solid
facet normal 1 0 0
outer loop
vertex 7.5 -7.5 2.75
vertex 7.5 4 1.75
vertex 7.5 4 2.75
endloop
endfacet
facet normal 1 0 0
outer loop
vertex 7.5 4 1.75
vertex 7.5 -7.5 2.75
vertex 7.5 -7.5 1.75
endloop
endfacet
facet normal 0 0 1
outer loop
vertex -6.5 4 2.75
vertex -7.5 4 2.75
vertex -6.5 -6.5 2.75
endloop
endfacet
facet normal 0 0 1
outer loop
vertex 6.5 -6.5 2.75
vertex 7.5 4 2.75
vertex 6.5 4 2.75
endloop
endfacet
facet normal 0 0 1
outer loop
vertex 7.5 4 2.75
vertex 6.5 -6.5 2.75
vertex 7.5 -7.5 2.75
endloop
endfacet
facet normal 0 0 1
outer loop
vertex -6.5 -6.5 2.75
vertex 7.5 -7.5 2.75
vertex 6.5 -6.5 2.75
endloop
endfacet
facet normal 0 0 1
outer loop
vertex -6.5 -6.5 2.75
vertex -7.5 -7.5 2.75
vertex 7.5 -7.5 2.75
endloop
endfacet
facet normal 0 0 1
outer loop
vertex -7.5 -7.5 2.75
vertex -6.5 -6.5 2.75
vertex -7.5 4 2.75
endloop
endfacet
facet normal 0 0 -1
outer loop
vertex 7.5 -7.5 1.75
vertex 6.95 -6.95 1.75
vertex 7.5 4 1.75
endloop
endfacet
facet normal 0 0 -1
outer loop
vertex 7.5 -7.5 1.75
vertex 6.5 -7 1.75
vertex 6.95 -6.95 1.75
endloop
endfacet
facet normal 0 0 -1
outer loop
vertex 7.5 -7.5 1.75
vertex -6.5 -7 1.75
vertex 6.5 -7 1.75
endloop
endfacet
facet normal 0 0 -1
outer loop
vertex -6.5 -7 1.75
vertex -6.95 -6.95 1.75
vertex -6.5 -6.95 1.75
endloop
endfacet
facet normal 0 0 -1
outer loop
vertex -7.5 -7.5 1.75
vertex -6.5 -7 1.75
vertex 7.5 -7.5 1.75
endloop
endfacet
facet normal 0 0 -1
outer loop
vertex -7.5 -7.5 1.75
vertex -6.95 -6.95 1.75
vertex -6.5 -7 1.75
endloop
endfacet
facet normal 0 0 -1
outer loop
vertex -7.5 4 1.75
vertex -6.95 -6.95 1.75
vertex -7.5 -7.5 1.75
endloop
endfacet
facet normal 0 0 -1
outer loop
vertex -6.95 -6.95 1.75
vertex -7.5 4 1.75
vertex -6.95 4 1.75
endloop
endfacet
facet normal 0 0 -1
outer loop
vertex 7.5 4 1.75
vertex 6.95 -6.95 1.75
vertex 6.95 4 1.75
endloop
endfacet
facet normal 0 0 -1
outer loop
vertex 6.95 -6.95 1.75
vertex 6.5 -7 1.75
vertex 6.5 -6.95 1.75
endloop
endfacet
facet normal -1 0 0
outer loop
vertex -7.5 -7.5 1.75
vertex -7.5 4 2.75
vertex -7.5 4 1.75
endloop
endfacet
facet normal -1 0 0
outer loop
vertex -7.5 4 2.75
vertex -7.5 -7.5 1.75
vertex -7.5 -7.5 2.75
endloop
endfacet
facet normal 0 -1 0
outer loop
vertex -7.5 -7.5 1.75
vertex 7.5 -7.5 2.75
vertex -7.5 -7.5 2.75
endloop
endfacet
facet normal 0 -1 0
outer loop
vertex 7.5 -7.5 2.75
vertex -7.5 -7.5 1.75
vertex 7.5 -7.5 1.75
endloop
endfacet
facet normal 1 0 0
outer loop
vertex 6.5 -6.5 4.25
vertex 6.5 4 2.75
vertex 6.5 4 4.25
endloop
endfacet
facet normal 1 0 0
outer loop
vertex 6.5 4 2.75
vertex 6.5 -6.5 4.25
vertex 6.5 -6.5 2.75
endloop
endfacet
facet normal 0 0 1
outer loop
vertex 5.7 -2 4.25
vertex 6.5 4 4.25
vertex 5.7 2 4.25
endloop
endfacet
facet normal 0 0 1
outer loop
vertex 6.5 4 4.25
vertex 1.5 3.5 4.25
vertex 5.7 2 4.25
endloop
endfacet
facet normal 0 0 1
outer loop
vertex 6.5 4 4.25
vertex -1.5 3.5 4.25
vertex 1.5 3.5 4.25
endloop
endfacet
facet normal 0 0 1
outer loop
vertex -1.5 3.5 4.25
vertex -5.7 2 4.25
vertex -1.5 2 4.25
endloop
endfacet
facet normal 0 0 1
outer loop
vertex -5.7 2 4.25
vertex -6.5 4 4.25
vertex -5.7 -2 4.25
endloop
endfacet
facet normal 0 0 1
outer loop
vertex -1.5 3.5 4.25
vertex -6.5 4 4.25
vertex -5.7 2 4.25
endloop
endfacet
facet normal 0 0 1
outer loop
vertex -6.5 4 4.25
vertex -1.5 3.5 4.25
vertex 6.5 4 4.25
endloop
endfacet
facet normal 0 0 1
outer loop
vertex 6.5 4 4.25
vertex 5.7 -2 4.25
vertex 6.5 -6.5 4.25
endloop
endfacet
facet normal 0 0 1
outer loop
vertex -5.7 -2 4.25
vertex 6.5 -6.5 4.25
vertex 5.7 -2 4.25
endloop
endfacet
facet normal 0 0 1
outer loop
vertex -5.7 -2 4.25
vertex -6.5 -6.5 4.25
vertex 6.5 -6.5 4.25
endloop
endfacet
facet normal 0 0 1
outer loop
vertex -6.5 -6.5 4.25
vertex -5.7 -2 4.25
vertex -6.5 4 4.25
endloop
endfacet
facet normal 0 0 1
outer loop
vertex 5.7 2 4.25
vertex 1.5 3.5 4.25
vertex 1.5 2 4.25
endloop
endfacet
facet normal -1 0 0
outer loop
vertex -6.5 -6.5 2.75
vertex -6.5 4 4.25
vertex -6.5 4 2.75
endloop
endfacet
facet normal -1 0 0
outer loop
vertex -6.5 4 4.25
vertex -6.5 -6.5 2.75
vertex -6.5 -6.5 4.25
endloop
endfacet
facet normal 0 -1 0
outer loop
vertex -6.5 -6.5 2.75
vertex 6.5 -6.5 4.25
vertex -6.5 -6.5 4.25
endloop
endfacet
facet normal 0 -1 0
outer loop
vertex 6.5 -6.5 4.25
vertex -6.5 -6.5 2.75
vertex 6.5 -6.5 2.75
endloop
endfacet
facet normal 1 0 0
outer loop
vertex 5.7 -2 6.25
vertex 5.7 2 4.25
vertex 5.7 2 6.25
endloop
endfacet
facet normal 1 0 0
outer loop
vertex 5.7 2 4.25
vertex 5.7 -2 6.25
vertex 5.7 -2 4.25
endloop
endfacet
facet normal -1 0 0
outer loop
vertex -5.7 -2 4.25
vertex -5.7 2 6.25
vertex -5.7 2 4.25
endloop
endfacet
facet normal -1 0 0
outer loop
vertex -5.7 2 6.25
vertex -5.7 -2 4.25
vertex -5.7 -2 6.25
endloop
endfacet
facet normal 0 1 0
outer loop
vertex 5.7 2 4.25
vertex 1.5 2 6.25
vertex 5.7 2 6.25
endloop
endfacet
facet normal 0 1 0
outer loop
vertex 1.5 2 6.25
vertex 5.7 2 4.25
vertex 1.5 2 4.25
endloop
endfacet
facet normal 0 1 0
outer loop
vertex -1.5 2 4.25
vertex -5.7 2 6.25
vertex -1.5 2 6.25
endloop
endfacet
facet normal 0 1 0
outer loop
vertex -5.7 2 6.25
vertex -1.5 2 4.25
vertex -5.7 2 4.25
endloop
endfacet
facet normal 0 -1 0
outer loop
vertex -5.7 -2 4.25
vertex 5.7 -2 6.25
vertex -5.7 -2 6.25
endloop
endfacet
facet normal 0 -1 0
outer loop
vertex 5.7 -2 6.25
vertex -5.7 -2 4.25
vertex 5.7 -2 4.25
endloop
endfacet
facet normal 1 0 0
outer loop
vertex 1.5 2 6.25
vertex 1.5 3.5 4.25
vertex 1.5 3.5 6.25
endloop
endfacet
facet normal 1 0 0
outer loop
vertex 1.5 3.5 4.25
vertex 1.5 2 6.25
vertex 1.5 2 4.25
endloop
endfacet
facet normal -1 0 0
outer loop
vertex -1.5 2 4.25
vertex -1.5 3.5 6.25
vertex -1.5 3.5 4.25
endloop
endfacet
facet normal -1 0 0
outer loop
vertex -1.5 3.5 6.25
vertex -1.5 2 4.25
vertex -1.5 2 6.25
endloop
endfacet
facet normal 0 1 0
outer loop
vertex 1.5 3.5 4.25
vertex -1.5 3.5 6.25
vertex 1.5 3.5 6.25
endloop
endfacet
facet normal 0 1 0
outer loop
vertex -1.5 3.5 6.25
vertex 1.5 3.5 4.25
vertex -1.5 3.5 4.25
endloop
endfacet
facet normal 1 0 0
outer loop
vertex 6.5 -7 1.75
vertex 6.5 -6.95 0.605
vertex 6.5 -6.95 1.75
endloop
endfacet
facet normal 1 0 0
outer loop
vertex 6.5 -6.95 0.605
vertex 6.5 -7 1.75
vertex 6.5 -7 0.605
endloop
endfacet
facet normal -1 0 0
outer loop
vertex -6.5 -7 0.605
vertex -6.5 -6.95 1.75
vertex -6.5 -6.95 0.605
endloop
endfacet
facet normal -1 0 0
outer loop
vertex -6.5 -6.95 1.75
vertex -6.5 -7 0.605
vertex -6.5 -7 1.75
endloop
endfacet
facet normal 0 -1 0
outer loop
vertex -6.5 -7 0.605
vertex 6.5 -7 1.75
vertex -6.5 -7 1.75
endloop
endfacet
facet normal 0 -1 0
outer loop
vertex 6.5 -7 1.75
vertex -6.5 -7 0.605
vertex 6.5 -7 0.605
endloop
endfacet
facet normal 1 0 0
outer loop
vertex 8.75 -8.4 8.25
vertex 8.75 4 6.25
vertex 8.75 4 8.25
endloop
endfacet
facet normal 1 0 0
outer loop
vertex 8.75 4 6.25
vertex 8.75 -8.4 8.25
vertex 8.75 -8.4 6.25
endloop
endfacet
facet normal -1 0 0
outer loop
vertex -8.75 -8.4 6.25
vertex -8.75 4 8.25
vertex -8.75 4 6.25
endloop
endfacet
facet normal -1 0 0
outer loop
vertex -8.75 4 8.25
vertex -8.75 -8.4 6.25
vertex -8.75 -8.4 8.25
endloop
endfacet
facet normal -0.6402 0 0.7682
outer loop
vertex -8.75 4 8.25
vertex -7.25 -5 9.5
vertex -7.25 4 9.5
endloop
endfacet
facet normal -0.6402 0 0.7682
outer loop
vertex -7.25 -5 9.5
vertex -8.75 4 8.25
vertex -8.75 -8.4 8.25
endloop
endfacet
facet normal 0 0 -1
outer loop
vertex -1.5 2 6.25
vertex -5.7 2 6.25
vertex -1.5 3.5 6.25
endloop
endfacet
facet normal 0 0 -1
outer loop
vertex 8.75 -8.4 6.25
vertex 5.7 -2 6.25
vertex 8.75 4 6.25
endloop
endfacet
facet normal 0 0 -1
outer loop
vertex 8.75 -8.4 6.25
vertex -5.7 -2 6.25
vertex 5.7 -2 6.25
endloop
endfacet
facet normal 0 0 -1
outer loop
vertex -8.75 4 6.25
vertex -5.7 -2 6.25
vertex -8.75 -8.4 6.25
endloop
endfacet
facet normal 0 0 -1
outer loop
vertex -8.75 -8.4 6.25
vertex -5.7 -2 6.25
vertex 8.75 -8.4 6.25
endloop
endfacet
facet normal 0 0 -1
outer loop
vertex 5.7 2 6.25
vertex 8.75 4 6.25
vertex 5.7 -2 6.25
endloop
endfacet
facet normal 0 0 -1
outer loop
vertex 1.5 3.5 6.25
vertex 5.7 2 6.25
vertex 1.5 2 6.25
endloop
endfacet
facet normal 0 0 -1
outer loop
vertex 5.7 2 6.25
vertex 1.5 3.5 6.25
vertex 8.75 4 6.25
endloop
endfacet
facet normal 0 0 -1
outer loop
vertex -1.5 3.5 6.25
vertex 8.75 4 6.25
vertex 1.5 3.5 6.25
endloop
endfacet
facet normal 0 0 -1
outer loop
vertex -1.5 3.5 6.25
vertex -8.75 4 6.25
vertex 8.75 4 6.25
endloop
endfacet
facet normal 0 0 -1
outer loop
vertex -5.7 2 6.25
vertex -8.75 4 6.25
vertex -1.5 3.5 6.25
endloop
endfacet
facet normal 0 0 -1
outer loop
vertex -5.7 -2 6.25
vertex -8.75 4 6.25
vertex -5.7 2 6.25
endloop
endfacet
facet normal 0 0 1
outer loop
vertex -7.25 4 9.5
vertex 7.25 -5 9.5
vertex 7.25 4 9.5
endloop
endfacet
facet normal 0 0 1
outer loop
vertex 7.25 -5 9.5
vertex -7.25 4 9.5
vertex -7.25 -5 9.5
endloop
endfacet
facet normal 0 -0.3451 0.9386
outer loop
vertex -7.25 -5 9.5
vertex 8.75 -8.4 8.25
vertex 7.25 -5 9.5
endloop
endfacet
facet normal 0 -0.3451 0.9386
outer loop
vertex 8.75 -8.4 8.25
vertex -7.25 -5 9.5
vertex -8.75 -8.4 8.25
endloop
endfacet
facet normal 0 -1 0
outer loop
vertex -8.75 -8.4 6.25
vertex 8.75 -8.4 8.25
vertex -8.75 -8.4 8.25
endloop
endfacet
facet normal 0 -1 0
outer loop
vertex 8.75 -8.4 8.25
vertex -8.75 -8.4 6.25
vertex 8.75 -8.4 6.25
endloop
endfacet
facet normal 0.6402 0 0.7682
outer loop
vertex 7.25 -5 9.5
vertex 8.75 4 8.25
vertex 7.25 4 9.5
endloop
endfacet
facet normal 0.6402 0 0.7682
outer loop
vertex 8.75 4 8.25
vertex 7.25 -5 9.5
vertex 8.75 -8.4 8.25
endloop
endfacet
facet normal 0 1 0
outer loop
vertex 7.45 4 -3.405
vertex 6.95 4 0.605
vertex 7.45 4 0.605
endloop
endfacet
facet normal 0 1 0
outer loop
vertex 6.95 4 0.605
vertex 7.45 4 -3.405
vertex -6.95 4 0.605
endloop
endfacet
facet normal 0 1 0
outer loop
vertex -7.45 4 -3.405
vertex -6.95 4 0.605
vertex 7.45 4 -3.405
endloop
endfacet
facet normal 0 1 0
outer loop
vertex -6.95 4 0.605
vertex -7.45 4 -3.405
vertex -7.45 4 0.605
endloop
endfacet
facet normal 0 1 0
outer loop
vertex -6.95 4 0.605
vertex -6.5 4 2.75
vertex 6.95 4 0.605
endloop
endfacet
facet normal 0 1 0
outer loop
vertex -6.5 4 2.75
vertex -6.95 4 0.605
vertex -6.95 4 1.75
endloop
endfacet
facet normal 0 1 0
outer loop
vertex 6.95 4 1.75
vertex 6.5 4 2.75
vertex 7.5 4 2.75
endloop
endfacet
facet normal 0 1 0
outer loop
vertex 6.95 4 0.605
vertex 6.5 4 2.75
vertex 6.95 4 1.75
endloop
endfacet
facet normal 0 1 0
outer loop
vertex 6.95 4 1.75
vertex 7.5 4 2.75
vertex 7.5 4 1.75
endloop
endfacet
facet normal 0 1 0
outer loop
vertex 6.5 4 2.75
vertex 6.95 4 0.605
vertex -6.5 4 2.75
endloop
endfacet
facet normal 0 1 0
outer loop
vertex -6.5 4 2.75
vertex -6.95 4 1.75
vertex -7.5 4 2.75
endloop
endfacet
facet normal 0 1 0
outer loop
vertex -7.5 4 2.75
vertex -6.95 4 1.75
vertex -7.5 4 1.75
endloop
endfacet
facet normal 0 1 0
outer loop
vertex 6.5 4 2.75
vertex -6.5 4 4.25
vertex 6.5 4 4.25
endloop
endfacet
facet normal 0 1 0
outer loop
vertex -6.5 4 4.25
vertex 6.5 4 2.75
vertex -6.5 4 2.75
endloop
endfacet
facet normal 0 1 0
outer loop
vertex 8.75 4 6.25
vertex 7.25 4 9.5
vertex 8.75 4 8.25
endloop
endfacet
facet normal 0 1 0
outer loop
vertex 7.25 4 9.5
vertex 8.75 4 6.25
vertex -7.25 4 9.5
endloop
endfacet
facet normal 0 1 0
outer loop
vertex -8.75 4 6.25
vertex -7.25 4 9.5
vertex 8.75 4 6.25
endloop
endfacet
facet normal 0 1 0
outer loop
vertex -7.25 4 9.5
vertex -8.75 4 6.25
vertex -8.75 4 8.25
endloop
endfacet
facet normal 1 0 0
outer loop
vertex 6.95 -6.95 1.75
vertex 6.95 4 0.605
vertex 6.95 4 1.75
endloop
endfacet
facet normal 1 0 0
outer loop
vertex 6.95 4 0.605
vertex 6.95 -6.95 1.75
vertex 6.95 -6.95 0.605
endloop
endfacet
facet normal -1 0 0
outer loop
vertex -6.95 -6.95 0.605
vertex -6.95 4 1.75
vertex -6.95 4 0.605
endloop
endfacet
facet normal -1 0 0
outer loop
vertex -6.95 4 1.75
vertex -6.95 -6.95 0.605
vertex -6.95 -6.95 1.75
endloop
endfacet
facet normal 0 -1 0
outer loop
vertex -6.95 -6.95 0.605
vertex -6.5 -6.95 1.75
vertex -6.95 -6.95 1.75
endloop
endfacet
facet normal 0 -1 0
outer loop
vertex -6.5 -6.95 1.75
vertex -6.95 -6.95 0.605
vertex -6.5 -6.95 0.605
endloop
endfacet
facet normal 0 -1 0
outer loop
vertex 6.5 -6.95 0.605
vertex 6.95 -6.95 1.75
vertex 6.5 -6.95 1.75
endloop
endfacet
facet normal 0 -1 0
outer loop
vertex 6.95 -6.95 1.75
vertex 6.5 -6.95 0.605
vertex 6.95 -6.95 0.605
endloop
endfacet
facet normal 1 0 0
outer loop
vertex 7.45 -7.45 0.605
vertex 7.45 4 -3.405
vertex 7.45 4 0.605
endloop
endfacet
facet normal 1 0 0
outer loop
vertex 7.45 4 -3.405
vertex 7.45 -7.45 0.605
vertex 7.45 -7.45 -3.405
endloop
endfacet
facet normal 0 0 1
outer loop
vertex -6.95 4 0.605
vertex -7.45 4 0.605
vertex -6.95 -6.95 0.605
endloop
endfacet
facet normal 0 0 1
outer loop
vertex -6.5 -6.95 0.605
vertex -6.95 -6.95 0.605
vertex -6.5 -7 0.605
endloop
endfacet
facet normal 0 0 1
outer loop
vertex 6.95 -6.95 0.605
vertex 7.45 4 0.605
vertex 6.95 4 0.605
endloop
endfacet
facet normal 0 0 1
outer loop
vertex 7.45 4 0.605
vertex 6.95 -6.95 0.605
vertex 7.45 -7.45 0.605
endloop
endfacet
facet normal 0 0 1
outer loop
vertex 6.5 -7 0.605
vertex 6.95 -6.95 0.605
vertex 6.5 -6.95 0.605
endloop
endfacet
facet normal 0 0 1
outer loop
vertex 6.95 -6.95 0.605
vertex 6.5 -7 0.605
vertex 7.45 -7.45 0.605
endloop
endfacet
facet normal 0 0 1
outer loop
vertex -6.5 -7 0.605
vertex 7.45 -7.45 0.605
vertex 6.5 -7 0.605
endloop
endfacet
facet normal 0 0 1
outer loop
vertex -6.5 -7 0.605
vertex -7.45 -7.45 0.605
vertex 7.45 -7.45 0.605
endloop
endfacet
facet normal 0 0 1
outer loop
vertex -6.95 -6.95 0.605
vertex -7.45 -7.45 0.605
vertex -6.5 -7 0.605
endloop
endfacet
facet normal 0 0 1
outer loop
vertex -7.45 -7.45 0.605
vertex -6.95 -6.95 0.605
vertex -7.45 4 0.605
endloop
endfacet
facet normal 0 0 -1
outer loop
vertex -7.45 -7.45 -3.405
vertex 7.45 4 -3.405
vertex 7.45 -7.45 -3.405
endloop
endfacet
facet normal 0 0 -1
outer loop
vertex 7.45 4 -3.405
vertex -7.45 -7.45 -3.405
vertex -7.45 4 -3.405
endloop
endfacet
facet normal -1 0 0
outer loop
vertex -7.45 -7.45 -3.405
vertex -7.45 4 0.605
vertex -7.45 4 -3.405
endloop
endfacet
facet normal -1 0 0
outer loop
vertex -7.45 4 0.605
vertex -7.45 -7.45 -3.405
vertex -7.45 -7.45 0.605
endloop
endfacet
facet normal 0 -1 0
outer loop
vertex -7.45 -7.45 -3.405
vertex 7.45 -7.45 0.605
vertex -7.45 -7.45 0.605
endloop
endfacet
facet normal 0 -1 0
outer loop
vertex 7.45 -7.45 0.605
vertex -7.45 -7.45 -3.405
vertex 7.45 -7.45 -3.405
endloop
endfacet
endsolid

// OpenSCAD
//Enum Switch Type
MX   = 0;  // Generic MX
Choc = 1;  // Low profile 
Alps = 2;  // For Your Superiority Complex's Needs

//Switch cutawy Type
Cherry = 0; 
Box    = 1; 
Alps   = 2;

//Cap type applys to MX only?
//Cherry = 0;
DSA = 1;
SA  = 2;
MT3 = 3;

//parameters
plate_thickness = 1;
plate_size = 15.6;
edge_offset = 1;
bottom_height = 5;
bottom_size = plate_size - 2;

top_height = 11.6;

switch_height = 3.0;
switch_thick = 1;
switch_width = 5;
switch_length = 3;

cap_height = .38*25.4;
cap_heightShift = 0.69*25.4;
cap_width = 18.3;

bottom_height = 4.5;
bottom_chamfer_width = 3.05;
bottom_chamfer_height =  1;
bottom_chamfer_thickness = .6;

bottom_peg_diameter = 4.075/.97;
bottom_peg_height =  3.5;
bottom_peg_chamfer = .5;
bottom_peg_side_scale = 1.7/4;

//dummy key switch with caps to check position
module Switch(switchScale= [1,1,1], CapColor = "ivory", StemColor = "black", clipLength = 0, type = Choc, Caps = DSA, Row = 0)
{
  if (type == MX){
    difference(){
      union(){
        translate([0,0,-switch_height])
        {
          color("grey"){
            translate([-bottom_size/2, -bottom_size/2 ,0])cube([bottom_size,bottom_size,bottom_height]);
            translate([-plate_size/2-edge_offset /2, -plate_size/2-edge_offset/2, bottom_height])cube([15.6+edge_offset ,15.6+edge_offset ,1]);

            translate([-plate_size/2, -plate_size/2, bottom_height])cube([15.6,15.6,1]);
            translate([-plate_size/2, -plate_size/2, bottom_height])cube([15.6,15.6,1]);

            translate([0,0, bottom_height+plate_thickness])translate([-15.6/2,13.6/2,0])rotate([90,0,0])linear_extrude(13.6)polygon(points = [[0,0], [15.6, 0], [13.6, 5.6], [2,5.6]]);
          }

          color(StemColor){
            translate([-switch_width/2, -switch_thick/2, top_height-1])cube([switch_width, switch_thick, switch_height]);
            translate([-switch_thick/2, -switch_length/2, top_height-1])cube([switch_thick, switch_length, switch_height]);
            translate([-plate_size/4, -plate_size/6, top_height-.5])cube([plate_size/2, plate_size/3, 0.25]);
          }

          scale(switchScale)color(CapColor){
            translate([0,0,cap_heightShift-2])rotate([0,0,45])cylinder(d1 = cap_width*sqrt(2),d2 = (plate_size -4)*sqrt(2), 7.5, $fn=4, center = true);
          }

          color("grey"){
            translate([0,0, -(bottom_peg_height -bottom_peg_chamfer)]){
              cylinder(d=bottom_peg_diameter, h= bottom_peg_height -bottom_peg_chamfer);
              translate([5,0,0])scale(v=[bottom_peg_side_scale,bottom_peg_side_scale,1])cylinder(d=bottom_peg_diameter, h= bottom_peg_height -bottom_peg_chamfer);
              translate([-5,0,0])scale(v=[bottom_peg_side_scale,bottom_peg_side_scale,1])cylinder(d=bottom_peg_diameter, h= bottom_peg_height -bottom_peg_chamfer);

              translate([0,0, -bottom_peg_chamfer]){
                cylinder(d2=bottom_peg_diameter , d1 = bottom_peg_diameter -2*bottom_peg_chamfer, h= bottom_peg_chamfer);
                translate([5,0,0])scale(v=[bottom_peg_side_scale,bottom_peg_side_scale,1])cylinder(d2=bottom_peg_diameter , d1 = bottom_peg_diameter -2*bottom_peg_chamfer, h= bottom_peg_chamfer);
                translate([-5,0,0])scale(v=[bottom_peg_side_scale,bottom_peg_side_scale,1])cylinder(d2=bottom_peg_diameter , d1 = bottom_peg_diameter -2*bottom_peg_chamfer, h= bottom_peg_chamfer);
              }
            }
          }
        }
      }
      if (clipLength != 0){ // commiting unholy act in name of ergonomics
        translate([0, -sign(clipLength)*7.8-clipLength,  0])scale(switchScale)cube([20, 15.6, 40], center = true);
      }
    }
  } else if (type == Choc){
    difference(){
      union(){
        translate([0,0,1.75]){
          difference(){
            translate([0,0,0.5])cube([15,15,1], center = true);
            //cuts
        //    translate([15/2-1/2,0,.5])cube([1,10.5,2], center = true);
        //    translate([-15/2+1/2,0,.5])cube([1,10.5,2], center = true);
          }

          translate([0,0,1.5])cube([13,13,2], center = true);
          color(StemColor)translate([0,0,4])cube([11.4,4,3], center = true);
          color(StemColor)translate([0,1,4])cube([3,5,3], center = true);
          color("DarkSlateGray")translate([0,0,-1])cube([13,14,2,],center = true);
          color("DarkSlateGray")translate([0,0,-2-2.5])cylinder(d=3.3, 2.5);
          color("DarkSlateGray")translate([5,0,-2-2.5])cylinder(d=1.6, 2.5); 
          color("DarkSlateGray")translate([-5,0,-2-2.5])cylinder(d=1.6, 2.5); 

          //cap
          scale(switchScale)color(CapColor)hull(){
            translate([0,0,4.5+1])cube([17.5,16.8,2],center = true);
            translate([0,1.25,4.5+1+1.5])cube([14.5,12.5,1.5],center = true);
          }
        }
      }
      if (clipLength != 0){ // commiting unholy act in name of ergonomics
        translate([0, -sign(clipLength)*7.8-clipLength,  0])scale(switchScale)cube([20, 15.6, 40], center = true);
      }
    }
  }
  else if (type == Alps){
    //TODO build Alps MockUp
  }
}

module Cutter()
{
  bottom_height = 4.5;
  bottom_chamfer_width = 3;
  bottom_chamfer_height =  1;
  bottom_chamfer_thickness = .6;

  bottom_peg_diameter = 4;
  bottom_peg_height =  3;
  bottom_peg_chamfer = 1;
  bottom_peg_side_scale = 1.7/4;

  translate([-bottom_size/2, -bottom_size/2 ,0])cube([bottom_size,bottom_size,bottom_height]);

  translate([0,0, -(bottom_peg_height -bottom_peg_chamfer)]){
    cylinder(d=bottom_peg_diameter, h= bottom_peg_height -bottom_peg_chamfer);
    translate([5,0,0])scale(v=[bottom_peg_side_scale,bottom_peg_side_scale,1])cylinder(d=bottom_peg_diameter, h= bottom_peg_height -bottom_peg_chamfer);
    translate([-5,0,0])scale(v=[bottom_peg_side_scale,bottom_peg_side_scale,1])cylinder(d=bottom_peg_diameter, h= bottom_peg_height -bottom_peg_chamfer);

    translate([0,0, -bottom_peg_chamfer]){
      cylinder(d2=bottom_peg_diameter , d1 = bottom_peg_diameter -2*bottom_peg_chamfer, h= bottom_peg_chamfer);
      translate([5,0,0])scale(v=[bottom_peg_side_scale,bottom_peg_side_scale,1])cylinder(d2=bottom_peg_diameter , d1 = bottom_peg_diameter -2*bottom_peg_chamfer, h= bottom_peg_chamfer);
      translate([-5,0,0])scale(v=[bottom_peg_side_scale,bottom_peg_side_scale,1])cylinder(d2=bottom_peg_diameter , d1 = bottom_peg_diameter -2*bottom_peg_chamfer, h= bottom_peg_chamfer);
    }
  }
}

module Keyhole(tol = .1, cutThickness = .5, clipLength = 0, type = Box)
{
  $fn = 10;
  bottom_length = 13.9+tol;
   plate_thickness = 3.51; //mm
  holeLength = bottom_length+tol*2;
  //latch nibs
  nib_radius= 1;
  nib_length = 3;
  if(type == Box){
    translate([0,0,-1.25])difference(){
      union(){
        translate([0,0,1.25])cube([holeLength, holeLength, plate_thickness+tol], center =true);
        translate([0,0,.1-cutThickness/2])cube([holeLength+1, holeLength+1, plate_thickness+cutThickness], center =true);  
      }
      
      union(){
        if (clipLength != 0){
          translate([0, -sign(clipLength)*7.8-clipLength, 0])cube([20, 15.6, 40], center = true);
        }
      }
    }
  } else if (type == Cherry){
    difference(){
      translate([0,0,-cutThickness/2])cube( [holeLength, holeLength, plate_thickness+cutThickness], center =true);

      union(){
        hull(){
          translate([(holeLength)/2, ,0,-plate_thickness/2+nib_radius])rotate([90,0,0])cylinder(r =nib_radius , nib_length,center = true);
          translate([(holeLength)/2, ,-nib_length/2,-plate_thickness/2])cube([nib_radius*2, nib_length, plate_thickness]);
        }
        mirror([1,0,0])hull(){
          translate([(holeLength)/2, ,0,-plate_thickness/2+nib_radius])rotate([90,0,0])cylinder(r =nib_radius , nib_length,center = true);
          translate([(holeLength)/2, ,-nib_length/2,-plate_thickness/2])cube([nib_radius*2, nib_length, plate_thickness]);
        }
        if (clipLength != 0){
          translate([0, -sign(clipLength)*7.8-clipLength, 0])cube([20, 15.6, 40], center = true);
        }
      }    
    }
  }
}

module Stabilizer(offsets = 23.8/2)
{
  plate_thickness = 3.6; //mm
  stabilizer_width = 5;
  stabilizer_length = 12.2;
  translate([offsets,0,0])cube([stabilizer_width,stabilizer_length,plate_thickness], center = true);
  translate([-offsets,0,0])cube([stabilizer_width,stabilizer_length,plate_thickness], center = true);
}

module TrackPoint(nibLength = 20)
{
  color("red")translate([0,0,-.5])cube([4.5,4.5,5], center= true); //nib
  color("gold")cylinder(d = 2, nibLength); //nib
  color("gold")translate([0,0,nibLength])sphere(2); //nib
  translate([0,30.3/2-8,-3/2])cube([26.46, 30.3, 3], center = true);
}

module RotaryEncoder(stemLength = 13, Wheel = 0)
{
 color("grey")translate([0,0, -6.1/2])cube([11.5, 13.5, 6.1], center = true);
 cylinder(d = 7, 7.8);

 translate([0,0,7.8])difference(){
   cylinder(d = 5.8, stemLength);
   translate([-5.8/2,5.8/2-1.5,3])cube([11.5, 13.5, stemLength]);
 }
 color("grey")translate([0,0,7.8])cylinder(d = Wheel, stemLength);
}

//################ Test Calls ###################
#Switch(switchScale= [1,1,1],clipLength = -4, type = Choc, StemColor = "purple");
Keyhole(0, clipLength = -4, type = Box);
//Stabilizer(20);
// RotaryEncoder(Wheel = 0);
//Switch([1,1.5,1]);
//TrackPoint();
